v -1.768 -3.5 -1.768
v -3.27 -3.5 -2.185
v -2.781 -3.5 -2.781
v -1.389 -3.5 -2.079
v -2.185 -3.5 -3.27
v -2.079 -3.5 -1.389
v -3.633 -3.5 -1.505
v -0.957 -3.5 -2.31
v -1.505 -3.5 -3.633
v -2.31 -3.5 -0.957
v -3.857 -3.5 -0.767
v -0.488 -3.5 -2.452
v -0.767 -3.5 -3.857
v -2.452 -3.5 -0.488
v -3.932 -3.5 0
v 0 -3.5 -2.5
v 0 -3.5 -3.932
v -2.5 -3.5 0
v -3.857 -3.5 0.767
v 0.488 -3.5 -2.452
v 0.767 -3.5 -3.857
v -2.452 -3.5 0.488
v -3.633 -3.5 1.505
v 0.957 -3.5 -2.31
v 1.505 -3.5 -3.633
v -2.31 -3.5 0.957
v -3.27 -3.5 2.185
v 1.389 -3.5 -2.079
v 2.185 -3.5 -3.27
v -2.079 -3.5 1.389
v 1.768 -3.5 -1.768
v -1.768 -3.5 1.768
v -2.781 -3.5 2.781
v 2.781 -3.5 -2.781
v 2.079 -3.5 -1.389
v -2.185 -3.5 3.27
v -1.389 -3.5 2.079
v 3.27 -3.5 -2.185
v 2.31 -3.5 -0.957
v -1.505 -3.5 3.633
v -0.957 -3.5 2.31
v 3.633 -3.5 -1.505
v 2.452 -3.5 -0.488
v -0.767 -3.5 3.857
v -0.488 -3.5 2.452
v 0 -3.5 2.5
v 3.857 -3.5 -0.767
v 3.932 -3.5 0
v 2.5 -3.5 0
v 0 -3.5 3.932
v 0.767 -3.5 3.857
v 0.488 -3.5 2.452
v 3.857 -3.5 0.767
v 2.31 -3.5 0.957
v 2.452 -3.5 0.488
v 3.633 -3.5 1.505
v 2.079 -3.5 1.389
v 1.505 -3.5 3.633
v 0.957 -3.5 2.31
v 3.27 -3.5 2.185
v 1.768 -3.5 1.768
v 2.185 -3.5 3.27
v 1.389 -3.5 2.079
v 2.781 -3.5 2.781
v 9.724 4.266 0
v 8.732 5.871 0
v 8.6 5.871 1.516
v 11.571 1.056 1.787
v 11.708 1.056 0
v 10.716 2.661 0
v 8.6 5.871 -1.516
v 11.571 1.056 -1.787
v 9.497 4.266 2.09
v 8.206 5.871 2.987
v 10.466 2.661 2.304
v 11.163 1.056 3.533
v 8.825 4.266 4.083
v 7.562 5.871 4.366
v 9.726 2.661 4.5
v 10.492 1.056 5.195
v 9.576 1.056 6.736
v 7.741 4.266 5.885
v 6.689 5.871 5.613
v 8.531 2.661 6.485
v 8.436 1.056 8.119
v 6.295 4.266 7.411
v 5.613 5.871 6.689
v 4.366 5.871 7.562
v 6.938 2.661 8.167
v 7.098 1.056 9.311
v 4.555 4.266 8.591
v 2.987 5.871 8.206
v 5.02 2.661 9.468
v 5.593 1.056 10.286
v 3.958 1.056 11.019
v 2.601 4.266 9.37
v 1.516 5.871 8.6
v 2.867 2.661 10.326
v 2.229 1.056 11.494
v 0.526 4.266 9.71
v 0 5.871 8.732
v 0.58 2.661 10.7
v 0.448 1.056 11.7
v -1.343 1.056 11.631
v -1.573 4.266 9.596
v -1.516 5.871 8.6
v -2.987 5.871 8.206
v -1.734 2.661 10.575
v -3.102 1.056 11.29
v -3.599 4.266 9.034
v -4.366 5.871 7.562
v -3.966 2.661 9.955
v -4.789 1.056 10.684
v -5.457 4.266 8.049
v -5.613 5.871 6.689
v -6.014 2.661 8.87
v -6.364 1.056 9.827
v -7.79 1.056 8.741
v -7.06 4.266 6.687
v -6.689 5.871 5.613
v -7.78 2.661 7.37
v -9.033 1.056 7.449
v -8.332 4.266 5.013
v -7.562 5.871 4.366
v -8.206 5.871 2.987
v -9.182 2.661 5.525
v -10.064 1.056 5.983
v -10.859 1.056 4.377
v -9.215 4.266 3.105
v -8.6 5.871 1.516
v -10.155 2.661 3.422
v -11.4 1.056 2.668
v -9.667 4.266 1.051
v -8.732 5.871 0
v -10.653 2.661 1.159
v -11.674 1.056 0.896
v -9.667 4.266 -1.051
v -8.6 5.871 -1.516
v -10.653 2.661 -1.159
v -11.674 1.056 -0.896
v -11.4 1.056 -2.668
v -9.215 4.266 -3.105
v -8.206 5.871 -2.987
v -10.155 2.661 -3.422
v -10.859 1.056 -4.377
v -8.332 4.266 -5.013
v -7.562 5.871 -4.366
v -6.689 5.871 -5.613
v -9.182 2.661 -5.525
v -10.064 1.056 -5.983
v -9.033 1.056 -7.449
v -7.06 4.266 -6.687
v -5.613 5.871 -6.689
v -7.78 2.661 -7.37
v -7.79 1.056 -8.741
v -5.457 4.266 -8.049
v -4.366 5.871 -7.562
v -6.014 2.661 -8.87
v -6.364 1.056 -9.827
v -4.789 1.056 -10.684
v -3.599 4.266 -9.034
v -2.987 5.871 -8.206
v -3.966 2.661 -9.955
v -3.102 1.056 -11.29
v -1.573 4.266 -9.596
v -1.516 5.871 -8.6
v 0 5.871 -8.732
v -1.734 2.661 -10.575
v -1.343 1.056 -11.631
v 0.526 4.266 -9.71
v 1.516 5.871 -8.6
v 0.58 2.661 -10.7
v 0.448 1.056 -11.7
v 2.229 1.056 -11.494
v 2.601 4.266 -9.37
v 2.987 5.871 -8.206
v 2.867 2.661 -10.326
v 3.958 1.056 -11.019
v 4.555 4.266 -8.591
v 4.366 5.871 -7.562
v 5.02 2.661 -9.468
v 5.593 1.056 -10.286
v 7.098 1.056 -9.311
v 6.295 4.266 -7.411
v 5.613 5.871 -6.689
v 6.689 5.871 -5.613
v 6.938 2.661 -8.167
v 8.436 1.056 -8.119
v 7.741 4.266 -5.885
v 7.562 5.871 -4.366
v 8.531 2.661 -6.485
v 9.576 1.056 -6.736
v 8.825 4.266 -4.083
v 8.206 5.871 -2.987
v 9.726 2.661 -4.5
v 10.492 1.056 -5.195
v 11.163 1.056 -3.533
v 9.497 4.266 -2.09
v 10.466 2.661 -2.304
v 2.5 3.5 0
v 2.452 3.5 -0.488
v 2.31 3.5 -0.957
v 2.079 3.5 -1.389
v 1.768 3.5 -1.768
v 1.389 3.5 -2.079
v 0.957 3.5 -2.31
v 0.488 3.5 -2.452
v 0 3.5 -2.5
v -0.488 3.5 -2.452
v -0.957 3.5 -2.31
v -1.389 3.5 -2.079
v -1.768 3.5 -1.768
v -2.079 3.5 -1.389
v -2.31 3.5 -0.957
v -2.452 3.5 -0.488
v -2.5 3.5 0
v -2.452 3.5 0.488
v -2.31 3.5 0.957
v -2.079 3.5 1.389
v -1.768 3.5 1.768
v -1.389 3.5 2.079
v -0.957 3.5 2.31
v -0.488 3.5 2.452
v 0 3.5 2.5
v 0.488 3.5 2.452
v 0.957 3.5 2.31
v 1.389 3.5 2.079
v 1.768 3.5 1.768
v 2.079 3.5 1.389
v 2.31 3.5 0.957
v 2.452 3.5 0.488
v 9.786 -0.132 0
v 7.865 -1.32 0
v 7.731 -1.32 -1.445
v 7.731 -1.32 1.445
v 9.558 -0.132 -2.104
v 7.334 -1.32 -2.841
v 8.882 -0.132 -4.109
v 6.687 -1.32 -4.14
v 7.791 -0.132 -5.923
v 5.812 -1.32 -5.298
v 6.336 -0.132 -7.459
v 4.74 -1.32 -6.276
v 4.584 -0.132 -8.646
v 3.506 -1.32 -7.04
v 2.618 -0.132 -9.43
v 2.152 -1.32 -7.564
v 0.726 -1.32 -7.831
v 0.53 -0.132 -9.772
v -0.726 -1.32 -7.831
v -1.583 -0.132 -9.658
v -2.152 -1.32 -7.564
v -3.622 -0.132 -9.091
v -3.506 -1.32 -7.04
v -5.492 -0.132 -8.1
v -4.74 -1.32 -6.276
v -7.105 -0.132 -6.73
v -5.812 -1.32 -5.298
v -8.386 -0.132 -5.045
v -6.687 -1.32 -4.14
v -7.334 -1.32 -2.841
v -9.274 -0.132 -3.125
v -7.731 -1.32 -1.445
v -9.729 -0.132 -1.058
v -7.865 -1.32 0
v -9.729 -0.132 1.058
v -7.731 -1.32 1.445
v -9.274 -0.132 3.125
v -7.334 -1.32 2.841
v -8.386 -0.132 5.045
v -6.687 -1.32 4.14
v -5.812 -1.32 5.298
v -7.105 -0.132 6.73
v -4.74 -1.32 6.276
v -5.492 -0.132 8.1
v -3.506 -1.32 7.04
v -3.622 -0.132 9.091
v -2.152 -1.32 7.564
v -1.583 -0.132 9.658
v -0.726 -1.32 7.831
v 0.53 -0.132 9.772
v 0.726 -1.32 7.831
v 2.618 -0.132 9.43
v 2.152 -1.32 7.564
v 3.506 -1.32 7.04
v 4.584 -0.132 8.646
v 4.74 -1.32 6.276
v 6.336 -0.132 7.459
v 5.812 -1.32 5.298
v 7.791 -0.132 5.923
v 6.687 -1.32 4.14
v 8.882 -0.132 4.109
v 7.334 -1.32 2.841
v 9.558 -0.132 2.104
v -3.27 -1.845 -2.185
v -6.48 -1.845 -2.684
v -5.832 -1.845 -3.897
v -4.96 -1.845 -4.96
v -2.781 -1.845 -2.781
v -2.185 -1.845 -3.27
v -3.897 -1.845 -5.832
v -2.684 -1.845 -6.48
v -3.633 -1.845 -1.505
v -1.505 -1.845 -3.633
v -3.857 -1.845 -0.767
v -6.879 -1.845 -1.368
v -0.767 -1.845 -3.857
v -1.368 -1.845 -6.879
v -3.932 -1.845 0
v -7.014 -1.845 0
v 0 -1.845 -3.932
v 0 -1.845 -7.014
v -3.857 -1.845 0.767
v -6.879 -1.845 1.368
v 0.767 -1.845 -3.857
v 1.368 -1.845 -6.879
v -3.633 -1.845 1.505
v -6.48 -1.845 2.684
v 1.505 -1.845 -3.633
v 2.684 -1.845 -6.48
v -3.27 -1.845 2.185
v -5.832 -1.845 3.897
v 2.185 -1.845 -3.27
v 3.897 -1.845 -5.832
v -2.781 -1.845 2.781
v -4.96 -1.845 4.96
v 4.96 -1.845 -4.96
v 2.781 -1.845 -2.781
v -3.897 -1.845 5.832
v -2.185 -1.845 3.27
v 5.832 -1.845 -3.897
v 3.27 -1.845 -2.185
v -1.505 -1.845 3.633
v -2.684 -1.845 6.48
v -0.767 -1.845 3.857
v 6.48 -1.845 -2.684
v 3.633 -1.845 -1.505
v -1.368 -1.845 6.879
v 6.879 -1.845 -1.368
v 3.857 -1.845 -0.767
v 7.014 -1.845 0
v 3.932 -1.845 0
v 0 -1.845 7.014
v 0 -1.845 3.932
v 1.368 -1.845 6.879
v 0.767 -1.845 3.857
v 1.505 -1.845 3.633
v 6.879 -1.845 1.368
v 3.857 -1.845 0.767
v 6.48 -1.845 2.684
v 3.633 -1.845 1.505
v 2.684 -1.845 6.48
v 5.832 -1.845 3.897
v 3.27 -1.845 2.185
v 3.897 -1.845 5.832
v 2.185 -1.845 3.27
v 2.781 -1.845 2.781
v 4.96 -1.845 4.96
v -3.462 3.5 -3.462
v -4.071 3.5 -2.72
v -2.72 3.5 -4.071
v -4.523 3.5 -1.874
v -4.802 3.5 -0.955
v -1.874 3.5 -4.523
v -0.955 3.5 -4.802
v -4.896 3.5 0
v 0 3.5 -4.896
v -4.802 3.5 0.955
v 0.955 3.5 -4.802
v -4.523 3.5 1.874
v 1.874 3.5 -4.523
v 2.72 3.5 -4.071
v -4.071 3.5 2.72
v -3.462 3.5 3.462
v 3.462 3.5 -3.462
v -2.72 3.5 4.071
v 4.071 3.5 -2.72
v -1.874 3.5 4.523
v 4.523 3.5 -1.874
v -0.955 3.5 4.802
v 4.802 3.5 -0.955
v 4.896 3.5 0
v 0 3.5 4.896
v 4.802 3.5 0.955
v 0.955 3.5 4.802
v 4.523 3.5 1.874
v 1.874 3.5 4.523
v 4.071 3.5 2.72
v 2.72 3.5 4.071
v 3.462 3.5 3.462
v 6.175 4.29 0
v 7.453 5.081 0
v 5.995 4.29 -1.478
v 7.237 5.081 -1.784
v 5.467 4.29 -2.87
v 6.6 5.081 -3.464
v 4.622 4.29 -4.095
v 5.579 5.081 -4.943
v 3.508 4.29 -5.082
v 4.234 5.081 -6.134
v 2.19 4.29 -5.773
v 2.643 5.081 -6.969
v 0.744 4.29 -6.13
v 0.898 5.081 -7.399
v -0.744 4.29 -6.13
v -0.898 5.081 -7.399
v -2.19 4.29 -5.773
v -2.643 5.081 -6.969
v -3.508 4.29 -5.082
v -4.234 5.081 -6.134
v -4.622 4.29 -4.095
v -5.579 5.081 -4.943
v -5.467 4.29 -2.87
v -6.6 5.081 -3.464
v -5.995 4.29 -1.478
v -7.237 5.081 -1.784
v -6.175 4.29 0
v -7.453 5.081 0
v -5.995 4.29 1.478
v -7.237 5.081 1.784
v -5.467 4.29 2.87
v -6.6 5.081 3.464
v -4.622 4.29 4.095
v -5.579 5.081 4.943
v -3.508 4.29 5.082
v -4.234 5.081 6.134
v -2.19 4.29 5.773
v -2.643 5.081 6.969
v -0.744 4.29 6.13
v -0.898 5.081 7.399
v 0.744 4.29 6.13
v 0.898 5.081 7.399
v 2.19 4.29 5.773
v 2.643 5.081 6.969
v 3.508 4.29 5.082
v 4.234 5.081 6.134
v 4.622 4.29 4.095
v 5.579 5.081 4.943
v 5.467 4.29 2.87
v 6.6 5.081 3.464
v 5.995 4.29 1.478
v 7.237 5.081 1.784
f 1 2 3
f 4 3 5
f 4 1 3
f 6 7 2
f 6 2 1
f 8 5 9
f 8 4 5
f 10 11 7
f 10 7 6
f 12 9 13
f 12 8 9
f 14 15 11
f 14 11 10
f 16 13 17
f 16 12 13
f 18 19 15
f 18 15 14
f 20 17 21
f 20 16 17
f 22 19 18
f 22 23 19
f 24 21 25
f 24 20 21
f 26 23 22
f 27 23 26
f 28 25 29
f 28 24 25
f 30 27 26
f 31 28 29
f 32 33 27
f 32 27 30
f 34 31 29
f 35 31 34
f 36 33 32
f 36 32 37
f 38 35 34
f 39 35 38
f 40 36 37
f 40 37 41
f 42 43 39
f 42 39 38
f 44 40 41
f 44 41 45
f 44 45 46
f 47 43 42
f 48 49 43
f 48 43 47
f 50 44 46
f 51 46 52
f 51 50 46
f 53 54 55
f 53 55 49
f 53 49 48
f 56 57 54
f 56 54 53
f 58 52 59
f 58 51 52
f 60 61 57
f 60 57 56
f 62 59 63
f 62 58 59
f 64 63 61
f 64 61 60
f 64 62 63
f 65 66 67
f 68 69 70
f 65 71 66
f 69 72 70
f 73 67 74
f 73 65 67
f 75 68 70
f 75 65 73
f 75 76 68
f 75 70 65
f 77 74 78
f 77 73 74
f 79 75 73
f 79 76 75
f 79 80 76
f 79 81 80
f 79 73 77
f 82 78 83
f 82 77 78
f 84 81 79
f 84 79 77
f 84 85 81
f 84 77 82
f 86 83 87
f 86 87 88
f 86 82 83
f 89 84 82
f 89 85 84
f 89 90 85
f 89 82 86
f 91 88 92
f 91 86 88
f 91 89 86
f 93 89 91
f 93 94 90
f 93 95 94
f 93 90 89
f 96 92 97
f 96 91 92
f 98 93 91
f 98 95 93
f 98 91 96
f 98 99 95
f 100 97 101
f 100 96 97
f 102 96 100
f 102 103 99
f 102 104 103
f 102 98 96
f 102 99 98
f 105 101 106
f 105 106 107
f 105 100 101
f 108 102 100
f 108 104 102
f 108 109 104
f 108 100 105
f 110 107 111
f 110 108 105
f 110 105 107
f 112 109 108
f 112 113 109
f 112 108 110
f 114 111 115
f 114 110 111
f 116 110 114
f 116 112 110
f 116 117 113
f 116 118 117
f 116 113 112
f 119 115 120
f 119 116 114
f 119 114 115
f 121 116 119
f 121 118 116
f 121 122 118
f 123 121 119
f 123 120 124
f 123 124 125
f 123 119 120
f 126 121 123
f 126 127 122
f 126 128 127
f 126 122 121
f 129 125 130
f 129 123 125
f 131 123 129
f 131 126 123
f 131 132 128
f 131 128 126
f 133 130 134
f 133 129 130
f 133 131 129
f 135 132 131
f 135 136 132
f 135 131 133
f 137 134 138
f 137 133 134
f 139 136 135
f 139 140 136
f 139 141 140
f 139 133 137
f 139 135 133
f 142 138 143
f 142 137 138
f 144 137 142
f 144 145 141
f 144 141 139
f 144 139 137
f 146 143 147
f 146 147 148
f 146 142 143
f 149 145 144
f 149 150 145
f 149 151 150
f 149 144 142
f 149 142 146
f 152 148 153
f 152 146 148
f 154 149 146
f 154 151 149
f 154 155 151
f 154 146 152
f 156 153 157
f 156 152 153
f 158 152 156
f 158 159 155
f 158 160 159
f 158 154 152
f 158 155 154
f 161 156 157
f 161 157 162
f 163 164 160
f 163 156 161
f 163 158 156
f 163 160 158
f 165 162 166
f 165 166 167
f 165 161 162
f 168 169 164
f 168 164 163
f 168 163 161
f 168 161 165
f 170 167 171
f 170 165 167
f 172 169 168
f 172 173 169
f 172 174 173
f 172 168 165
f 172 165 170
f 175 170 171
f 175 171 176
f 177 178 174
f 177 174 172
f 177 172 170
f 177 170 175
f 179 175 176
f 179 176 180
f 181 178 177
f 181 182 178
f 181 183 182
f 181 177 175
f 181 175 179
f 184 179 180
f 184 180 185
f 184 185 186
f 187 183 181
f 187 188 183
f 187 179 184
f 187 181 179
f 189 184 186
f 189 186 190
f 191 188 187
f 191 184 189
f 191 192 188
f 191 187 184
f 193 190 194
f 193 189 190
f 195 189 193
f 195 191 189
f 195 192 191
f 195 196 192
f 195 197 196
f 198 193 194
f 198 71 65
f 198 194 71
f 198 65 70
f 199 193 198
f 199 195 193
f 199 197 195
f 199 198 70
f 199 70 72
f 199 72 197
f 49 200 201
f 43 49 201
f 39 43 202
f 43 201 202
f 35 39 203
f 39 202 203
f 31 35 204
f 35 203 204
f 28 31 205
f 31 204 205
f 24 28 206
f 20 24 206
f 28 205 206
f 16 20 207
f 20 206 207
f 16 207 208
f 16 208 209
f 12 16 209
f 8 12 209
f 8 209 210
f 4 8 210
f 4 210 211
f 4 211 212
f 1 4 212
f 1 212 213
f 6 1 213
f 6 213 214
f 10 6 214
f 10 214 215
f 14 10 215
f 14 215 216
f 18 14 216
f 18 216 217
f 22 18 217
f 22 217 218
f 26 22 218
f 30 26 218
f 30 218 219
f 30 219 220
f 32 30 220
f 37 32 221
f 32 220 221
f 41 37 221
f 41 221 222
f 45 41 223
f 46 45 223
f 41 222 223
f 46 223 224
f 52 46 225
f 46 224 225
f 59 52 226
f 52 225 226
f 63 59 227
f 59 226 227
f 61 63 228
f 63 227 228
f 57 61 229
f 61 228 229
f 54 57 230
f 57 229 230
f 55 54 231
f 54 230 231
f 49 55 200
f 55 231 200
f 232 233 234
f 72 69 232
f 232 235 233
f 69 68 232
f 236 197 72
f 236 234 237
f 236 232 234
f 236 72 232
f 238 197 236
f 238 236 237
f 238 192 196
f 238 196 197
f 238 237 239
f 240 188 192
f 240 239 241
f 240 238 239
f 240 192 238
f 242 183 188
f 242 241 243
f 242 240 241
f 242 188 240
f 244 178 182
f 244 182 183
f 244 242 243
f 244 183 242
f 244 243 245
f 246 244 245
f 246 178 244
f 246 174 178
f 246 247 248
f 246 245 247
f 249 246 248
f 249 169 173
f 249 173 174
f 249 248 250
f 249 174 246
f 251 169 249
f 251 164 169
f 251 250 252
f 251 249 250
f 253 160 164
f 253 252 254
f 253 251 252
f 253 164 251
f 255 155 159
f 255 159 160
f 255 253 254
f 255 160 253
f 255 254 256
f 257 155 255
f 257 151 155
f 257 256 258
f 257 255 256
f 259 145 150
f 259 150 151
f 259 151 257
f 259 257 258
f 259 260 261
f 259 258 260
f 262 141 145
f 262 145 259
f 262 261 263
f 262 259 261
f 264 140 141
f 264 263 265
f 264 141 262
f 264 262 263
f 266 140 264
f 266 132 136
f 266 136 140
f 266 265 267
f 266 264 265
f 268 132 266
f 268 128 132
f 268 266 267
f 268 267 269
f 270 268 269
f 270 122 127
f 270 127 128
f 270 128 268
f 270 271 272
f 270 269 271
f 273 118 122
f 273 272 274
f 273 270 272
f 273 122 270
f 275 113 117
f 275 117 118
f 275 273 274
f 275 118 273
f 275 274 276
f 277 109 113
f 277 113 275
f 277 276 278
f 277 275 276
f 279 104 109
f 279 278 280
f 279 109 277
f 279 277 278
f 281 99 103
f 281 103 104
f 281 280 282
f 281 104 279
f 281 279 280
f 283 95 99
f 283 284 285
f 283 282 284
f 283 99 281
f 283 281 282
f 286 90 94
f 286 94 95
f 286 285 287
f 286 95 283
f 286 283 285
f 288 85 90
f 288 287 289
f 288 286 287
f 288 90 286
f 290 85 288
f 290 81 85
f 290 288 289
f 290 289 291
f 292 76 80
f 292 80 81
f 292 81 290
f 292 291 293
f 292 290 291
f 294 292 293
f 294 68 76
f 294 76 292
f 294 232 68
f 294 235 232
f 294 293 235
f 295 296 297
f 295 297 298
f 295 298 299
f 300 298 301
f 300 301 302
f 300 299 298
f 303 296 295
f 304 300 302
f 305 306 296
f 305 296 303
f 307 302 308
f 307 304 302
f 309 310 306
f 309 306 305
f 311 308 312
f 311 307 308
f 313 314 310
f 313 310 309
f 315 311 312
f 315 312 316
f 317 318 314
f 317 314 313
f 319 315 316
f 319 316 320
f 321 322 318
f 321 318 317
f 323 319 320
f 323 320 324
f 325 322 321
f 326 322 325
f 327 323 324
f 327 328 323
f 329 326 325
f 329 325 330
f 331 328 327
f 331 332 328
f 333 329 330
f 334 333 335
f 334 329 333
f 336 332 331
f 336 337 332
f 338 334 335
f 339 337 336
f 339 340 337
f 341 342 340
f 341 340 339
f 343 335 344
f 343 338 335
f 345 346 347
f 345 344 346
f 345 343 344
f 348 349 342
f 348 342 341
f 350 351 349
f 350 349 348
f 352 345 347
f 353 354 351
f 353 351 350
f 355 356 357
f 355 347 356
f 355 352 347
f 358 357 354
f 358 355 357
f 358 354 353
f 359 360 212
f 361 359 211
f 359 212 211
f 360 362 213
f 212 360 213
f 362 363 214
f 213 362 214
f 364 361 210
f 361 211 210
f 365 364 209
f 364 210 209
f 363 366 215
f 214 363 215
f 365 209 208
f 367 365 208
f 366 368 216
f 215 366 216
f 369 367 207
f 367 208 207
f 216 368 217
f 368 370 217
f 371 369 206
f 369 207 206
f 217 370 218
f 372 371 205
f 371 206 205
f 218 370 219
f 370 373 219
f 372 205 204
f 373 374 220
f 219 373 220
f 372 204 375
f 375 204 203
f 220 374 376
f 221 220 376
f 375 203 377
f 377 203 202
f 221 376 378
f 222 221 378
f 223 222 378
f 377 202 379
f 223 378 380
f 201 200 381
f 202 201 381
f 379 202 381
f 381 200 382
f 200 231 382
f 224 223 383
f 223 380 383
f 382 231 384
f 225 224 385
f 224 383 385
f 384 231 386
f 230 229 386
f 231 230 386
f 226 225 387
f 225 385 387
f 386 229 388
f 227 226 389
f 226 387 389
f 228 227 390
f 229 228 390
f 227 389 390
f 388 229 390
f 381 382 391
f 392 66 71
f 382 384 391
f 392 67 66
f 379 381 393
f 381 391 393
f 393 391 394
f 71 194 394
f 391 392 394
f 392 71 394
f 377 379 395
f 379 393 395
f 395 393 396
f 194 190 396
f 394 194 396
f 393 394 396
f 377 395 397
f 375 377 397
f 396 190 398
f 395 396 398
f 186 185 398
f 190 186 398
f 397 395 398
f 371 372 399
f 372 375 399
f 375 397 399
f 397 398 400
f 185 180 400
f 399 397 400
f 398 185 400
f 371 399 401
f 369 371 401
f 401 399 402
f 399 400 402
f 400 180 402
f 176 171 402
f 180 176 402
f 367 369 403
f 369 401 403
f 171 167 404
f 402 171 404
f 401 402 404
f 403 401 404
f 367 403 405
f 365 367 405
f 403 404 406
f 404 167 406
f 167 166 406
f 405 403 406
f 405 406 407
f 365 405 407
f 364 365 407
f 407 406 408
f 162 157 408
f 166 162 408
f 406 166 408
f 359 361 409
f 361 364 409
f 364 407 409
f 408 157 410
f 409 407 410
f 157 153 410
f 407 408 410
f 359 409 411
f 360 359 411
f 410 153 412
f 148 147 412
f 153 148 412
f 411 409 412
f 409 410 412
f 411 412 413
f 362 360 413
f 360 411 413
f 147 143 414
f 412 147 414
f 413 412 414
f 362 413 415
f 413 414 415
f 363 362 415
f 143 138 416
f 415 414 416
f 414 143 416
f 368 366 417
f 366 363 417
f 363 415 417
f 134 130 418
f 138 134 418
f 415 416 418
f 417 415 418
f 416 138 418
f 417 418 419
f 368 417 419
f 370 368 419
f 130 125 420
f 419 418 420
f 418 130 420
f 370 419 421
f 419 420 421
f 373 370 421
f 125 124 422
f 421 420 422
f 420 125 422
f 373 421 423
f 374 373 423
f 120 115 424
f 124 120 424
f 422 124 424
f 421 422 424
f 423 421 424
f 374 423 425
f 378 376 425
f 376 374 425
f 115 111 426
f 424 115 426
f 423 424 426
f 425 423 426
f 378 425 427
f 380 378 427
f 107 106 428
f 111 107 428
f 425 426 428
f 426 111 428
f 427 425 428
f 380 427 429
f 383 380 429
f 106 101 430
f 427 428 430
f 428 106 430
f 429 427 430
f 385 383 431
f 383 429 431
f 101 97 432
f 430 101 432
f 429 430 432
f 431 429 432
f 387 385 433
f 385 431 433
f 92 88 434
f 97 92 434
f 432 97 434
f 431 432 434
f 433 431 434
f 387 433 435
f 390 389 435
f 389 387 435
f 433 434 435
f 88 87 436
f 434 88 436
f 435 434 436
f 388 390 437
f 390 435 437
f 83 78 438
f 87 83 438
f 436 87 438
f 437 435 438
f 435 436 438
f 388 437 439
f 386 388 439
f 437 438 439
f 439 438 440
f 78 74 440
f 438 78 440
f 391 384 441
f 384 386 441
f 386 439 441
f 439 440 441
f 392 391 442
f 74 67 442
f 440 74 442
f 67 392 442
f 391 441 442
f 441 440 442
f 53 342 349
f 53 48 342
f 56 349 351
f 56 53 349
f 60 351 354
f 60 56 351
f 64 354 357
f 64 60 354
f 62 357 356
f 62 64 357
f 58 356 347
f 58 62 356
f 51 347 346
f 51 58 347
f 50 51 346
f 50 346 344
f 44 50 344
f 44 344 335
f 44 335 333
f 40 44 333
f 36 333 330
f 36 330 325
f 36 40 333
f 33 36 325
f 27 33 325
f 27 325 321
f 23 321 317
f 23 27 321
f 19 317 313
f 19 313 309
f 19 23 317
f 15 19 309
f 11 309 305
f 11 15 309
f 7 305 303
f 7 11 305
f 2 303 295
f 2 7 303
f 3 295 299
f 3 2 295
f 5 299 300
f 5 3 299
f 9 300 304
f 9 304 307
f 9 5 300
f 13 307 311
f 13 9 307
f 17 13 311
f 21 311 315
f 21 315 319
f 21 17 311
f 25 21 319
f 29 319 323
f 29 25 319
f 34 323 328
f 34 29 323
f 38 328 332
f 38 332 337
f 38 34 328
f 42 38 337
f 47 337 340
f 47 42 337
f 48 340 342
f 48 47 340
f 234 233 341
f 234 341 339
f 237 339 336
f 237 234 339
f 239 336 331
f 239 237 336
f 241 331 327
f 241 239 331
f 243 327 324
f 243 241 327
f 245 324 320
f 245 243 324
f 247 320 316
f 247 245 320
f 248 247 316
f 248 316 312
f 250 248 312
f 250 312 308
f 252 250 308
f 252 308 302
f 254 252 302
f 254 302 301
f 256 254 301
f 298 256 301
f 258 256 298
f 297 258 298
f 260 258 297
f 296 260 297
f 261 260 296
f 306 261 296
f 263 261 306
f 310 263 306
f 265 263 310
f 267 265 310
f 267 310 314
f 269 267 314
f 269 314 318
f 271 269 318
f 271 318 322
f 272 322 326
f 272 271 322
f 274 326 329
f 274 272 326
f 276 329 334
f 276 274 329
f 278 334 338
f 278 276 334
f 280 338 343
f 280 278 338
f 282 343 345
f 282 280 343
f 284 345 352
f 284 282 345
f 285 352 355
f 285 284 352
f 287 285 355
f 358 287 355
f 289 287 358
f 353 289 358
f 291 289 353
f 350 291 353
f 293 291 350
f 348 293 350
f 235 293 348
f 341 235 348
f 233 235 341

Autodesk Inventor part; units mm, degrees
ref_plane "YZ Plane" through (0, 0, 0) normal (1, 0, 0) x (0, 1, 0)
ref_plane "XZ Plane" through (0, 0, 0) normal (0, 1, 0) x (-1, 0, 0)
ref_plane "XY Plane" through (0, 0, 0) normal (0, 0, 1) x (1, 0, 0)
sketch "스케치1" plane through (0, 0, 0) normal (0, 0, 1) x (1, 0, 0)
  line L0 (-10, 0) -> (10, 0) construction
  line L1 (0, 0) -> (0, 20) construction
  line L2 (0, 20) -> (10, 0) construction
  line L3 (0, 20) -> (11.7082, 1.0557)
  line L4 (0, 20) -> (5.8657, 4.0994) construction
  line L5 (7.8647, -1.3197) -> (11.7082, 1.0557)
  line L6 (7.8647, -1.3197) -> (7.0141, -1.8454)
  line L7 (7.0141, -1.8454) -> (3.9324, -1.8454)
  line L8 (3.9324, -1.8454) -> (3.9324, -3.5)
  line L9 (3.9324, -3.5) -> (0, -3.5)
  line L10 (8.7322, 5.871) -> (4.8959, 3.5)
  line L11 (4.8959, 3.5) -> (0, 3.5)
  line L12 (0, 3.5) -> (0, -3.5)
  line L13 (5.8657, 4.0994) -> (7.8647, -1.3197)
  point P0 (5.8657, 4.0994)
  dimension "d0" = 20
  dimension "d1" = 20
  dimension "d4" = 2
  dimension "d5" = 2.5
  dimension "d6" = 1
  dimension "d8" = 3
  dimension "d11" = 3.5
  dimension "d12" = 7
  dimension "d40" = 4.5557
  dimension "d41" = 23.4164
revolve "회전1" add sketch "스케치1" angle 360 about axis through (0, 3.5, 0) along (0, -1, 0)
sketch "스케치4" plane through (0, 3.5, 0) normal (0, 1, 0) x (1, 0, 0)
  circle A0 centre (0, 0) radius 2.5
  dimension "d35" = 5
extrude "돌출1" cut sketch "스케치4" against normal blind 30.75
ref_plane "작업 평면4" through (7.8647, -1.3197, 0) normal (-0.5257, 0.8507, 0) x (-0.8507, -0.5257, 0)
sketch "스케치9" plane through (7.8647, -1.3197, 0) normal (-0.5257, 0.8507, 0) x (-0.8507, -0.5257, 0)
  ellipse E0 centre (5.4413, 0) end of major axis (5.4413, 11.7082) minor radius 9.9596 construction
  ellipse E1 centre (5.4413, 0) end of major axis (5.4413, 7.2082) minor radius 5.4596 (0.3405, 2.57) -> (0.0422, -1.07) ccw
  line L0 (-4.5183, 0) -> (-0.0183, 0)
  line L1 (-5.127, 1.07) -> (2.577, 1.07) construction
  line L2 (-5.5914, 1.57) -> (2.9534, 1.57) construction
  line L3 (-5.0964, 2.57) -> (1.9809, 2.57) construction
  arc A0 (-4.2754, 2.57) -> (0.0422, 1.07) centre (0.3783, 9.0013) ccw
  arc A1 (0.0422, -1.07) -> (-4.2754, -2.57) centre (0.3783, -9.0013) ccw
  line L4 (-4.2754, 2.57) -> (-6.6392, 2.57)
  line L5 (-6.6392, 2.57) -> (-6.6392, -2.57)
  line L6 (-6.6392, -2.57) -> (-4.2754, -2.57)
  point P0 (5.9964, 0)
  dimension "d55" = 1.57
  dimension "d56" = 4.5
  dimension "d57" = 0.5
  dimension "d58" = 1
properties part number "베벨기어 002"
